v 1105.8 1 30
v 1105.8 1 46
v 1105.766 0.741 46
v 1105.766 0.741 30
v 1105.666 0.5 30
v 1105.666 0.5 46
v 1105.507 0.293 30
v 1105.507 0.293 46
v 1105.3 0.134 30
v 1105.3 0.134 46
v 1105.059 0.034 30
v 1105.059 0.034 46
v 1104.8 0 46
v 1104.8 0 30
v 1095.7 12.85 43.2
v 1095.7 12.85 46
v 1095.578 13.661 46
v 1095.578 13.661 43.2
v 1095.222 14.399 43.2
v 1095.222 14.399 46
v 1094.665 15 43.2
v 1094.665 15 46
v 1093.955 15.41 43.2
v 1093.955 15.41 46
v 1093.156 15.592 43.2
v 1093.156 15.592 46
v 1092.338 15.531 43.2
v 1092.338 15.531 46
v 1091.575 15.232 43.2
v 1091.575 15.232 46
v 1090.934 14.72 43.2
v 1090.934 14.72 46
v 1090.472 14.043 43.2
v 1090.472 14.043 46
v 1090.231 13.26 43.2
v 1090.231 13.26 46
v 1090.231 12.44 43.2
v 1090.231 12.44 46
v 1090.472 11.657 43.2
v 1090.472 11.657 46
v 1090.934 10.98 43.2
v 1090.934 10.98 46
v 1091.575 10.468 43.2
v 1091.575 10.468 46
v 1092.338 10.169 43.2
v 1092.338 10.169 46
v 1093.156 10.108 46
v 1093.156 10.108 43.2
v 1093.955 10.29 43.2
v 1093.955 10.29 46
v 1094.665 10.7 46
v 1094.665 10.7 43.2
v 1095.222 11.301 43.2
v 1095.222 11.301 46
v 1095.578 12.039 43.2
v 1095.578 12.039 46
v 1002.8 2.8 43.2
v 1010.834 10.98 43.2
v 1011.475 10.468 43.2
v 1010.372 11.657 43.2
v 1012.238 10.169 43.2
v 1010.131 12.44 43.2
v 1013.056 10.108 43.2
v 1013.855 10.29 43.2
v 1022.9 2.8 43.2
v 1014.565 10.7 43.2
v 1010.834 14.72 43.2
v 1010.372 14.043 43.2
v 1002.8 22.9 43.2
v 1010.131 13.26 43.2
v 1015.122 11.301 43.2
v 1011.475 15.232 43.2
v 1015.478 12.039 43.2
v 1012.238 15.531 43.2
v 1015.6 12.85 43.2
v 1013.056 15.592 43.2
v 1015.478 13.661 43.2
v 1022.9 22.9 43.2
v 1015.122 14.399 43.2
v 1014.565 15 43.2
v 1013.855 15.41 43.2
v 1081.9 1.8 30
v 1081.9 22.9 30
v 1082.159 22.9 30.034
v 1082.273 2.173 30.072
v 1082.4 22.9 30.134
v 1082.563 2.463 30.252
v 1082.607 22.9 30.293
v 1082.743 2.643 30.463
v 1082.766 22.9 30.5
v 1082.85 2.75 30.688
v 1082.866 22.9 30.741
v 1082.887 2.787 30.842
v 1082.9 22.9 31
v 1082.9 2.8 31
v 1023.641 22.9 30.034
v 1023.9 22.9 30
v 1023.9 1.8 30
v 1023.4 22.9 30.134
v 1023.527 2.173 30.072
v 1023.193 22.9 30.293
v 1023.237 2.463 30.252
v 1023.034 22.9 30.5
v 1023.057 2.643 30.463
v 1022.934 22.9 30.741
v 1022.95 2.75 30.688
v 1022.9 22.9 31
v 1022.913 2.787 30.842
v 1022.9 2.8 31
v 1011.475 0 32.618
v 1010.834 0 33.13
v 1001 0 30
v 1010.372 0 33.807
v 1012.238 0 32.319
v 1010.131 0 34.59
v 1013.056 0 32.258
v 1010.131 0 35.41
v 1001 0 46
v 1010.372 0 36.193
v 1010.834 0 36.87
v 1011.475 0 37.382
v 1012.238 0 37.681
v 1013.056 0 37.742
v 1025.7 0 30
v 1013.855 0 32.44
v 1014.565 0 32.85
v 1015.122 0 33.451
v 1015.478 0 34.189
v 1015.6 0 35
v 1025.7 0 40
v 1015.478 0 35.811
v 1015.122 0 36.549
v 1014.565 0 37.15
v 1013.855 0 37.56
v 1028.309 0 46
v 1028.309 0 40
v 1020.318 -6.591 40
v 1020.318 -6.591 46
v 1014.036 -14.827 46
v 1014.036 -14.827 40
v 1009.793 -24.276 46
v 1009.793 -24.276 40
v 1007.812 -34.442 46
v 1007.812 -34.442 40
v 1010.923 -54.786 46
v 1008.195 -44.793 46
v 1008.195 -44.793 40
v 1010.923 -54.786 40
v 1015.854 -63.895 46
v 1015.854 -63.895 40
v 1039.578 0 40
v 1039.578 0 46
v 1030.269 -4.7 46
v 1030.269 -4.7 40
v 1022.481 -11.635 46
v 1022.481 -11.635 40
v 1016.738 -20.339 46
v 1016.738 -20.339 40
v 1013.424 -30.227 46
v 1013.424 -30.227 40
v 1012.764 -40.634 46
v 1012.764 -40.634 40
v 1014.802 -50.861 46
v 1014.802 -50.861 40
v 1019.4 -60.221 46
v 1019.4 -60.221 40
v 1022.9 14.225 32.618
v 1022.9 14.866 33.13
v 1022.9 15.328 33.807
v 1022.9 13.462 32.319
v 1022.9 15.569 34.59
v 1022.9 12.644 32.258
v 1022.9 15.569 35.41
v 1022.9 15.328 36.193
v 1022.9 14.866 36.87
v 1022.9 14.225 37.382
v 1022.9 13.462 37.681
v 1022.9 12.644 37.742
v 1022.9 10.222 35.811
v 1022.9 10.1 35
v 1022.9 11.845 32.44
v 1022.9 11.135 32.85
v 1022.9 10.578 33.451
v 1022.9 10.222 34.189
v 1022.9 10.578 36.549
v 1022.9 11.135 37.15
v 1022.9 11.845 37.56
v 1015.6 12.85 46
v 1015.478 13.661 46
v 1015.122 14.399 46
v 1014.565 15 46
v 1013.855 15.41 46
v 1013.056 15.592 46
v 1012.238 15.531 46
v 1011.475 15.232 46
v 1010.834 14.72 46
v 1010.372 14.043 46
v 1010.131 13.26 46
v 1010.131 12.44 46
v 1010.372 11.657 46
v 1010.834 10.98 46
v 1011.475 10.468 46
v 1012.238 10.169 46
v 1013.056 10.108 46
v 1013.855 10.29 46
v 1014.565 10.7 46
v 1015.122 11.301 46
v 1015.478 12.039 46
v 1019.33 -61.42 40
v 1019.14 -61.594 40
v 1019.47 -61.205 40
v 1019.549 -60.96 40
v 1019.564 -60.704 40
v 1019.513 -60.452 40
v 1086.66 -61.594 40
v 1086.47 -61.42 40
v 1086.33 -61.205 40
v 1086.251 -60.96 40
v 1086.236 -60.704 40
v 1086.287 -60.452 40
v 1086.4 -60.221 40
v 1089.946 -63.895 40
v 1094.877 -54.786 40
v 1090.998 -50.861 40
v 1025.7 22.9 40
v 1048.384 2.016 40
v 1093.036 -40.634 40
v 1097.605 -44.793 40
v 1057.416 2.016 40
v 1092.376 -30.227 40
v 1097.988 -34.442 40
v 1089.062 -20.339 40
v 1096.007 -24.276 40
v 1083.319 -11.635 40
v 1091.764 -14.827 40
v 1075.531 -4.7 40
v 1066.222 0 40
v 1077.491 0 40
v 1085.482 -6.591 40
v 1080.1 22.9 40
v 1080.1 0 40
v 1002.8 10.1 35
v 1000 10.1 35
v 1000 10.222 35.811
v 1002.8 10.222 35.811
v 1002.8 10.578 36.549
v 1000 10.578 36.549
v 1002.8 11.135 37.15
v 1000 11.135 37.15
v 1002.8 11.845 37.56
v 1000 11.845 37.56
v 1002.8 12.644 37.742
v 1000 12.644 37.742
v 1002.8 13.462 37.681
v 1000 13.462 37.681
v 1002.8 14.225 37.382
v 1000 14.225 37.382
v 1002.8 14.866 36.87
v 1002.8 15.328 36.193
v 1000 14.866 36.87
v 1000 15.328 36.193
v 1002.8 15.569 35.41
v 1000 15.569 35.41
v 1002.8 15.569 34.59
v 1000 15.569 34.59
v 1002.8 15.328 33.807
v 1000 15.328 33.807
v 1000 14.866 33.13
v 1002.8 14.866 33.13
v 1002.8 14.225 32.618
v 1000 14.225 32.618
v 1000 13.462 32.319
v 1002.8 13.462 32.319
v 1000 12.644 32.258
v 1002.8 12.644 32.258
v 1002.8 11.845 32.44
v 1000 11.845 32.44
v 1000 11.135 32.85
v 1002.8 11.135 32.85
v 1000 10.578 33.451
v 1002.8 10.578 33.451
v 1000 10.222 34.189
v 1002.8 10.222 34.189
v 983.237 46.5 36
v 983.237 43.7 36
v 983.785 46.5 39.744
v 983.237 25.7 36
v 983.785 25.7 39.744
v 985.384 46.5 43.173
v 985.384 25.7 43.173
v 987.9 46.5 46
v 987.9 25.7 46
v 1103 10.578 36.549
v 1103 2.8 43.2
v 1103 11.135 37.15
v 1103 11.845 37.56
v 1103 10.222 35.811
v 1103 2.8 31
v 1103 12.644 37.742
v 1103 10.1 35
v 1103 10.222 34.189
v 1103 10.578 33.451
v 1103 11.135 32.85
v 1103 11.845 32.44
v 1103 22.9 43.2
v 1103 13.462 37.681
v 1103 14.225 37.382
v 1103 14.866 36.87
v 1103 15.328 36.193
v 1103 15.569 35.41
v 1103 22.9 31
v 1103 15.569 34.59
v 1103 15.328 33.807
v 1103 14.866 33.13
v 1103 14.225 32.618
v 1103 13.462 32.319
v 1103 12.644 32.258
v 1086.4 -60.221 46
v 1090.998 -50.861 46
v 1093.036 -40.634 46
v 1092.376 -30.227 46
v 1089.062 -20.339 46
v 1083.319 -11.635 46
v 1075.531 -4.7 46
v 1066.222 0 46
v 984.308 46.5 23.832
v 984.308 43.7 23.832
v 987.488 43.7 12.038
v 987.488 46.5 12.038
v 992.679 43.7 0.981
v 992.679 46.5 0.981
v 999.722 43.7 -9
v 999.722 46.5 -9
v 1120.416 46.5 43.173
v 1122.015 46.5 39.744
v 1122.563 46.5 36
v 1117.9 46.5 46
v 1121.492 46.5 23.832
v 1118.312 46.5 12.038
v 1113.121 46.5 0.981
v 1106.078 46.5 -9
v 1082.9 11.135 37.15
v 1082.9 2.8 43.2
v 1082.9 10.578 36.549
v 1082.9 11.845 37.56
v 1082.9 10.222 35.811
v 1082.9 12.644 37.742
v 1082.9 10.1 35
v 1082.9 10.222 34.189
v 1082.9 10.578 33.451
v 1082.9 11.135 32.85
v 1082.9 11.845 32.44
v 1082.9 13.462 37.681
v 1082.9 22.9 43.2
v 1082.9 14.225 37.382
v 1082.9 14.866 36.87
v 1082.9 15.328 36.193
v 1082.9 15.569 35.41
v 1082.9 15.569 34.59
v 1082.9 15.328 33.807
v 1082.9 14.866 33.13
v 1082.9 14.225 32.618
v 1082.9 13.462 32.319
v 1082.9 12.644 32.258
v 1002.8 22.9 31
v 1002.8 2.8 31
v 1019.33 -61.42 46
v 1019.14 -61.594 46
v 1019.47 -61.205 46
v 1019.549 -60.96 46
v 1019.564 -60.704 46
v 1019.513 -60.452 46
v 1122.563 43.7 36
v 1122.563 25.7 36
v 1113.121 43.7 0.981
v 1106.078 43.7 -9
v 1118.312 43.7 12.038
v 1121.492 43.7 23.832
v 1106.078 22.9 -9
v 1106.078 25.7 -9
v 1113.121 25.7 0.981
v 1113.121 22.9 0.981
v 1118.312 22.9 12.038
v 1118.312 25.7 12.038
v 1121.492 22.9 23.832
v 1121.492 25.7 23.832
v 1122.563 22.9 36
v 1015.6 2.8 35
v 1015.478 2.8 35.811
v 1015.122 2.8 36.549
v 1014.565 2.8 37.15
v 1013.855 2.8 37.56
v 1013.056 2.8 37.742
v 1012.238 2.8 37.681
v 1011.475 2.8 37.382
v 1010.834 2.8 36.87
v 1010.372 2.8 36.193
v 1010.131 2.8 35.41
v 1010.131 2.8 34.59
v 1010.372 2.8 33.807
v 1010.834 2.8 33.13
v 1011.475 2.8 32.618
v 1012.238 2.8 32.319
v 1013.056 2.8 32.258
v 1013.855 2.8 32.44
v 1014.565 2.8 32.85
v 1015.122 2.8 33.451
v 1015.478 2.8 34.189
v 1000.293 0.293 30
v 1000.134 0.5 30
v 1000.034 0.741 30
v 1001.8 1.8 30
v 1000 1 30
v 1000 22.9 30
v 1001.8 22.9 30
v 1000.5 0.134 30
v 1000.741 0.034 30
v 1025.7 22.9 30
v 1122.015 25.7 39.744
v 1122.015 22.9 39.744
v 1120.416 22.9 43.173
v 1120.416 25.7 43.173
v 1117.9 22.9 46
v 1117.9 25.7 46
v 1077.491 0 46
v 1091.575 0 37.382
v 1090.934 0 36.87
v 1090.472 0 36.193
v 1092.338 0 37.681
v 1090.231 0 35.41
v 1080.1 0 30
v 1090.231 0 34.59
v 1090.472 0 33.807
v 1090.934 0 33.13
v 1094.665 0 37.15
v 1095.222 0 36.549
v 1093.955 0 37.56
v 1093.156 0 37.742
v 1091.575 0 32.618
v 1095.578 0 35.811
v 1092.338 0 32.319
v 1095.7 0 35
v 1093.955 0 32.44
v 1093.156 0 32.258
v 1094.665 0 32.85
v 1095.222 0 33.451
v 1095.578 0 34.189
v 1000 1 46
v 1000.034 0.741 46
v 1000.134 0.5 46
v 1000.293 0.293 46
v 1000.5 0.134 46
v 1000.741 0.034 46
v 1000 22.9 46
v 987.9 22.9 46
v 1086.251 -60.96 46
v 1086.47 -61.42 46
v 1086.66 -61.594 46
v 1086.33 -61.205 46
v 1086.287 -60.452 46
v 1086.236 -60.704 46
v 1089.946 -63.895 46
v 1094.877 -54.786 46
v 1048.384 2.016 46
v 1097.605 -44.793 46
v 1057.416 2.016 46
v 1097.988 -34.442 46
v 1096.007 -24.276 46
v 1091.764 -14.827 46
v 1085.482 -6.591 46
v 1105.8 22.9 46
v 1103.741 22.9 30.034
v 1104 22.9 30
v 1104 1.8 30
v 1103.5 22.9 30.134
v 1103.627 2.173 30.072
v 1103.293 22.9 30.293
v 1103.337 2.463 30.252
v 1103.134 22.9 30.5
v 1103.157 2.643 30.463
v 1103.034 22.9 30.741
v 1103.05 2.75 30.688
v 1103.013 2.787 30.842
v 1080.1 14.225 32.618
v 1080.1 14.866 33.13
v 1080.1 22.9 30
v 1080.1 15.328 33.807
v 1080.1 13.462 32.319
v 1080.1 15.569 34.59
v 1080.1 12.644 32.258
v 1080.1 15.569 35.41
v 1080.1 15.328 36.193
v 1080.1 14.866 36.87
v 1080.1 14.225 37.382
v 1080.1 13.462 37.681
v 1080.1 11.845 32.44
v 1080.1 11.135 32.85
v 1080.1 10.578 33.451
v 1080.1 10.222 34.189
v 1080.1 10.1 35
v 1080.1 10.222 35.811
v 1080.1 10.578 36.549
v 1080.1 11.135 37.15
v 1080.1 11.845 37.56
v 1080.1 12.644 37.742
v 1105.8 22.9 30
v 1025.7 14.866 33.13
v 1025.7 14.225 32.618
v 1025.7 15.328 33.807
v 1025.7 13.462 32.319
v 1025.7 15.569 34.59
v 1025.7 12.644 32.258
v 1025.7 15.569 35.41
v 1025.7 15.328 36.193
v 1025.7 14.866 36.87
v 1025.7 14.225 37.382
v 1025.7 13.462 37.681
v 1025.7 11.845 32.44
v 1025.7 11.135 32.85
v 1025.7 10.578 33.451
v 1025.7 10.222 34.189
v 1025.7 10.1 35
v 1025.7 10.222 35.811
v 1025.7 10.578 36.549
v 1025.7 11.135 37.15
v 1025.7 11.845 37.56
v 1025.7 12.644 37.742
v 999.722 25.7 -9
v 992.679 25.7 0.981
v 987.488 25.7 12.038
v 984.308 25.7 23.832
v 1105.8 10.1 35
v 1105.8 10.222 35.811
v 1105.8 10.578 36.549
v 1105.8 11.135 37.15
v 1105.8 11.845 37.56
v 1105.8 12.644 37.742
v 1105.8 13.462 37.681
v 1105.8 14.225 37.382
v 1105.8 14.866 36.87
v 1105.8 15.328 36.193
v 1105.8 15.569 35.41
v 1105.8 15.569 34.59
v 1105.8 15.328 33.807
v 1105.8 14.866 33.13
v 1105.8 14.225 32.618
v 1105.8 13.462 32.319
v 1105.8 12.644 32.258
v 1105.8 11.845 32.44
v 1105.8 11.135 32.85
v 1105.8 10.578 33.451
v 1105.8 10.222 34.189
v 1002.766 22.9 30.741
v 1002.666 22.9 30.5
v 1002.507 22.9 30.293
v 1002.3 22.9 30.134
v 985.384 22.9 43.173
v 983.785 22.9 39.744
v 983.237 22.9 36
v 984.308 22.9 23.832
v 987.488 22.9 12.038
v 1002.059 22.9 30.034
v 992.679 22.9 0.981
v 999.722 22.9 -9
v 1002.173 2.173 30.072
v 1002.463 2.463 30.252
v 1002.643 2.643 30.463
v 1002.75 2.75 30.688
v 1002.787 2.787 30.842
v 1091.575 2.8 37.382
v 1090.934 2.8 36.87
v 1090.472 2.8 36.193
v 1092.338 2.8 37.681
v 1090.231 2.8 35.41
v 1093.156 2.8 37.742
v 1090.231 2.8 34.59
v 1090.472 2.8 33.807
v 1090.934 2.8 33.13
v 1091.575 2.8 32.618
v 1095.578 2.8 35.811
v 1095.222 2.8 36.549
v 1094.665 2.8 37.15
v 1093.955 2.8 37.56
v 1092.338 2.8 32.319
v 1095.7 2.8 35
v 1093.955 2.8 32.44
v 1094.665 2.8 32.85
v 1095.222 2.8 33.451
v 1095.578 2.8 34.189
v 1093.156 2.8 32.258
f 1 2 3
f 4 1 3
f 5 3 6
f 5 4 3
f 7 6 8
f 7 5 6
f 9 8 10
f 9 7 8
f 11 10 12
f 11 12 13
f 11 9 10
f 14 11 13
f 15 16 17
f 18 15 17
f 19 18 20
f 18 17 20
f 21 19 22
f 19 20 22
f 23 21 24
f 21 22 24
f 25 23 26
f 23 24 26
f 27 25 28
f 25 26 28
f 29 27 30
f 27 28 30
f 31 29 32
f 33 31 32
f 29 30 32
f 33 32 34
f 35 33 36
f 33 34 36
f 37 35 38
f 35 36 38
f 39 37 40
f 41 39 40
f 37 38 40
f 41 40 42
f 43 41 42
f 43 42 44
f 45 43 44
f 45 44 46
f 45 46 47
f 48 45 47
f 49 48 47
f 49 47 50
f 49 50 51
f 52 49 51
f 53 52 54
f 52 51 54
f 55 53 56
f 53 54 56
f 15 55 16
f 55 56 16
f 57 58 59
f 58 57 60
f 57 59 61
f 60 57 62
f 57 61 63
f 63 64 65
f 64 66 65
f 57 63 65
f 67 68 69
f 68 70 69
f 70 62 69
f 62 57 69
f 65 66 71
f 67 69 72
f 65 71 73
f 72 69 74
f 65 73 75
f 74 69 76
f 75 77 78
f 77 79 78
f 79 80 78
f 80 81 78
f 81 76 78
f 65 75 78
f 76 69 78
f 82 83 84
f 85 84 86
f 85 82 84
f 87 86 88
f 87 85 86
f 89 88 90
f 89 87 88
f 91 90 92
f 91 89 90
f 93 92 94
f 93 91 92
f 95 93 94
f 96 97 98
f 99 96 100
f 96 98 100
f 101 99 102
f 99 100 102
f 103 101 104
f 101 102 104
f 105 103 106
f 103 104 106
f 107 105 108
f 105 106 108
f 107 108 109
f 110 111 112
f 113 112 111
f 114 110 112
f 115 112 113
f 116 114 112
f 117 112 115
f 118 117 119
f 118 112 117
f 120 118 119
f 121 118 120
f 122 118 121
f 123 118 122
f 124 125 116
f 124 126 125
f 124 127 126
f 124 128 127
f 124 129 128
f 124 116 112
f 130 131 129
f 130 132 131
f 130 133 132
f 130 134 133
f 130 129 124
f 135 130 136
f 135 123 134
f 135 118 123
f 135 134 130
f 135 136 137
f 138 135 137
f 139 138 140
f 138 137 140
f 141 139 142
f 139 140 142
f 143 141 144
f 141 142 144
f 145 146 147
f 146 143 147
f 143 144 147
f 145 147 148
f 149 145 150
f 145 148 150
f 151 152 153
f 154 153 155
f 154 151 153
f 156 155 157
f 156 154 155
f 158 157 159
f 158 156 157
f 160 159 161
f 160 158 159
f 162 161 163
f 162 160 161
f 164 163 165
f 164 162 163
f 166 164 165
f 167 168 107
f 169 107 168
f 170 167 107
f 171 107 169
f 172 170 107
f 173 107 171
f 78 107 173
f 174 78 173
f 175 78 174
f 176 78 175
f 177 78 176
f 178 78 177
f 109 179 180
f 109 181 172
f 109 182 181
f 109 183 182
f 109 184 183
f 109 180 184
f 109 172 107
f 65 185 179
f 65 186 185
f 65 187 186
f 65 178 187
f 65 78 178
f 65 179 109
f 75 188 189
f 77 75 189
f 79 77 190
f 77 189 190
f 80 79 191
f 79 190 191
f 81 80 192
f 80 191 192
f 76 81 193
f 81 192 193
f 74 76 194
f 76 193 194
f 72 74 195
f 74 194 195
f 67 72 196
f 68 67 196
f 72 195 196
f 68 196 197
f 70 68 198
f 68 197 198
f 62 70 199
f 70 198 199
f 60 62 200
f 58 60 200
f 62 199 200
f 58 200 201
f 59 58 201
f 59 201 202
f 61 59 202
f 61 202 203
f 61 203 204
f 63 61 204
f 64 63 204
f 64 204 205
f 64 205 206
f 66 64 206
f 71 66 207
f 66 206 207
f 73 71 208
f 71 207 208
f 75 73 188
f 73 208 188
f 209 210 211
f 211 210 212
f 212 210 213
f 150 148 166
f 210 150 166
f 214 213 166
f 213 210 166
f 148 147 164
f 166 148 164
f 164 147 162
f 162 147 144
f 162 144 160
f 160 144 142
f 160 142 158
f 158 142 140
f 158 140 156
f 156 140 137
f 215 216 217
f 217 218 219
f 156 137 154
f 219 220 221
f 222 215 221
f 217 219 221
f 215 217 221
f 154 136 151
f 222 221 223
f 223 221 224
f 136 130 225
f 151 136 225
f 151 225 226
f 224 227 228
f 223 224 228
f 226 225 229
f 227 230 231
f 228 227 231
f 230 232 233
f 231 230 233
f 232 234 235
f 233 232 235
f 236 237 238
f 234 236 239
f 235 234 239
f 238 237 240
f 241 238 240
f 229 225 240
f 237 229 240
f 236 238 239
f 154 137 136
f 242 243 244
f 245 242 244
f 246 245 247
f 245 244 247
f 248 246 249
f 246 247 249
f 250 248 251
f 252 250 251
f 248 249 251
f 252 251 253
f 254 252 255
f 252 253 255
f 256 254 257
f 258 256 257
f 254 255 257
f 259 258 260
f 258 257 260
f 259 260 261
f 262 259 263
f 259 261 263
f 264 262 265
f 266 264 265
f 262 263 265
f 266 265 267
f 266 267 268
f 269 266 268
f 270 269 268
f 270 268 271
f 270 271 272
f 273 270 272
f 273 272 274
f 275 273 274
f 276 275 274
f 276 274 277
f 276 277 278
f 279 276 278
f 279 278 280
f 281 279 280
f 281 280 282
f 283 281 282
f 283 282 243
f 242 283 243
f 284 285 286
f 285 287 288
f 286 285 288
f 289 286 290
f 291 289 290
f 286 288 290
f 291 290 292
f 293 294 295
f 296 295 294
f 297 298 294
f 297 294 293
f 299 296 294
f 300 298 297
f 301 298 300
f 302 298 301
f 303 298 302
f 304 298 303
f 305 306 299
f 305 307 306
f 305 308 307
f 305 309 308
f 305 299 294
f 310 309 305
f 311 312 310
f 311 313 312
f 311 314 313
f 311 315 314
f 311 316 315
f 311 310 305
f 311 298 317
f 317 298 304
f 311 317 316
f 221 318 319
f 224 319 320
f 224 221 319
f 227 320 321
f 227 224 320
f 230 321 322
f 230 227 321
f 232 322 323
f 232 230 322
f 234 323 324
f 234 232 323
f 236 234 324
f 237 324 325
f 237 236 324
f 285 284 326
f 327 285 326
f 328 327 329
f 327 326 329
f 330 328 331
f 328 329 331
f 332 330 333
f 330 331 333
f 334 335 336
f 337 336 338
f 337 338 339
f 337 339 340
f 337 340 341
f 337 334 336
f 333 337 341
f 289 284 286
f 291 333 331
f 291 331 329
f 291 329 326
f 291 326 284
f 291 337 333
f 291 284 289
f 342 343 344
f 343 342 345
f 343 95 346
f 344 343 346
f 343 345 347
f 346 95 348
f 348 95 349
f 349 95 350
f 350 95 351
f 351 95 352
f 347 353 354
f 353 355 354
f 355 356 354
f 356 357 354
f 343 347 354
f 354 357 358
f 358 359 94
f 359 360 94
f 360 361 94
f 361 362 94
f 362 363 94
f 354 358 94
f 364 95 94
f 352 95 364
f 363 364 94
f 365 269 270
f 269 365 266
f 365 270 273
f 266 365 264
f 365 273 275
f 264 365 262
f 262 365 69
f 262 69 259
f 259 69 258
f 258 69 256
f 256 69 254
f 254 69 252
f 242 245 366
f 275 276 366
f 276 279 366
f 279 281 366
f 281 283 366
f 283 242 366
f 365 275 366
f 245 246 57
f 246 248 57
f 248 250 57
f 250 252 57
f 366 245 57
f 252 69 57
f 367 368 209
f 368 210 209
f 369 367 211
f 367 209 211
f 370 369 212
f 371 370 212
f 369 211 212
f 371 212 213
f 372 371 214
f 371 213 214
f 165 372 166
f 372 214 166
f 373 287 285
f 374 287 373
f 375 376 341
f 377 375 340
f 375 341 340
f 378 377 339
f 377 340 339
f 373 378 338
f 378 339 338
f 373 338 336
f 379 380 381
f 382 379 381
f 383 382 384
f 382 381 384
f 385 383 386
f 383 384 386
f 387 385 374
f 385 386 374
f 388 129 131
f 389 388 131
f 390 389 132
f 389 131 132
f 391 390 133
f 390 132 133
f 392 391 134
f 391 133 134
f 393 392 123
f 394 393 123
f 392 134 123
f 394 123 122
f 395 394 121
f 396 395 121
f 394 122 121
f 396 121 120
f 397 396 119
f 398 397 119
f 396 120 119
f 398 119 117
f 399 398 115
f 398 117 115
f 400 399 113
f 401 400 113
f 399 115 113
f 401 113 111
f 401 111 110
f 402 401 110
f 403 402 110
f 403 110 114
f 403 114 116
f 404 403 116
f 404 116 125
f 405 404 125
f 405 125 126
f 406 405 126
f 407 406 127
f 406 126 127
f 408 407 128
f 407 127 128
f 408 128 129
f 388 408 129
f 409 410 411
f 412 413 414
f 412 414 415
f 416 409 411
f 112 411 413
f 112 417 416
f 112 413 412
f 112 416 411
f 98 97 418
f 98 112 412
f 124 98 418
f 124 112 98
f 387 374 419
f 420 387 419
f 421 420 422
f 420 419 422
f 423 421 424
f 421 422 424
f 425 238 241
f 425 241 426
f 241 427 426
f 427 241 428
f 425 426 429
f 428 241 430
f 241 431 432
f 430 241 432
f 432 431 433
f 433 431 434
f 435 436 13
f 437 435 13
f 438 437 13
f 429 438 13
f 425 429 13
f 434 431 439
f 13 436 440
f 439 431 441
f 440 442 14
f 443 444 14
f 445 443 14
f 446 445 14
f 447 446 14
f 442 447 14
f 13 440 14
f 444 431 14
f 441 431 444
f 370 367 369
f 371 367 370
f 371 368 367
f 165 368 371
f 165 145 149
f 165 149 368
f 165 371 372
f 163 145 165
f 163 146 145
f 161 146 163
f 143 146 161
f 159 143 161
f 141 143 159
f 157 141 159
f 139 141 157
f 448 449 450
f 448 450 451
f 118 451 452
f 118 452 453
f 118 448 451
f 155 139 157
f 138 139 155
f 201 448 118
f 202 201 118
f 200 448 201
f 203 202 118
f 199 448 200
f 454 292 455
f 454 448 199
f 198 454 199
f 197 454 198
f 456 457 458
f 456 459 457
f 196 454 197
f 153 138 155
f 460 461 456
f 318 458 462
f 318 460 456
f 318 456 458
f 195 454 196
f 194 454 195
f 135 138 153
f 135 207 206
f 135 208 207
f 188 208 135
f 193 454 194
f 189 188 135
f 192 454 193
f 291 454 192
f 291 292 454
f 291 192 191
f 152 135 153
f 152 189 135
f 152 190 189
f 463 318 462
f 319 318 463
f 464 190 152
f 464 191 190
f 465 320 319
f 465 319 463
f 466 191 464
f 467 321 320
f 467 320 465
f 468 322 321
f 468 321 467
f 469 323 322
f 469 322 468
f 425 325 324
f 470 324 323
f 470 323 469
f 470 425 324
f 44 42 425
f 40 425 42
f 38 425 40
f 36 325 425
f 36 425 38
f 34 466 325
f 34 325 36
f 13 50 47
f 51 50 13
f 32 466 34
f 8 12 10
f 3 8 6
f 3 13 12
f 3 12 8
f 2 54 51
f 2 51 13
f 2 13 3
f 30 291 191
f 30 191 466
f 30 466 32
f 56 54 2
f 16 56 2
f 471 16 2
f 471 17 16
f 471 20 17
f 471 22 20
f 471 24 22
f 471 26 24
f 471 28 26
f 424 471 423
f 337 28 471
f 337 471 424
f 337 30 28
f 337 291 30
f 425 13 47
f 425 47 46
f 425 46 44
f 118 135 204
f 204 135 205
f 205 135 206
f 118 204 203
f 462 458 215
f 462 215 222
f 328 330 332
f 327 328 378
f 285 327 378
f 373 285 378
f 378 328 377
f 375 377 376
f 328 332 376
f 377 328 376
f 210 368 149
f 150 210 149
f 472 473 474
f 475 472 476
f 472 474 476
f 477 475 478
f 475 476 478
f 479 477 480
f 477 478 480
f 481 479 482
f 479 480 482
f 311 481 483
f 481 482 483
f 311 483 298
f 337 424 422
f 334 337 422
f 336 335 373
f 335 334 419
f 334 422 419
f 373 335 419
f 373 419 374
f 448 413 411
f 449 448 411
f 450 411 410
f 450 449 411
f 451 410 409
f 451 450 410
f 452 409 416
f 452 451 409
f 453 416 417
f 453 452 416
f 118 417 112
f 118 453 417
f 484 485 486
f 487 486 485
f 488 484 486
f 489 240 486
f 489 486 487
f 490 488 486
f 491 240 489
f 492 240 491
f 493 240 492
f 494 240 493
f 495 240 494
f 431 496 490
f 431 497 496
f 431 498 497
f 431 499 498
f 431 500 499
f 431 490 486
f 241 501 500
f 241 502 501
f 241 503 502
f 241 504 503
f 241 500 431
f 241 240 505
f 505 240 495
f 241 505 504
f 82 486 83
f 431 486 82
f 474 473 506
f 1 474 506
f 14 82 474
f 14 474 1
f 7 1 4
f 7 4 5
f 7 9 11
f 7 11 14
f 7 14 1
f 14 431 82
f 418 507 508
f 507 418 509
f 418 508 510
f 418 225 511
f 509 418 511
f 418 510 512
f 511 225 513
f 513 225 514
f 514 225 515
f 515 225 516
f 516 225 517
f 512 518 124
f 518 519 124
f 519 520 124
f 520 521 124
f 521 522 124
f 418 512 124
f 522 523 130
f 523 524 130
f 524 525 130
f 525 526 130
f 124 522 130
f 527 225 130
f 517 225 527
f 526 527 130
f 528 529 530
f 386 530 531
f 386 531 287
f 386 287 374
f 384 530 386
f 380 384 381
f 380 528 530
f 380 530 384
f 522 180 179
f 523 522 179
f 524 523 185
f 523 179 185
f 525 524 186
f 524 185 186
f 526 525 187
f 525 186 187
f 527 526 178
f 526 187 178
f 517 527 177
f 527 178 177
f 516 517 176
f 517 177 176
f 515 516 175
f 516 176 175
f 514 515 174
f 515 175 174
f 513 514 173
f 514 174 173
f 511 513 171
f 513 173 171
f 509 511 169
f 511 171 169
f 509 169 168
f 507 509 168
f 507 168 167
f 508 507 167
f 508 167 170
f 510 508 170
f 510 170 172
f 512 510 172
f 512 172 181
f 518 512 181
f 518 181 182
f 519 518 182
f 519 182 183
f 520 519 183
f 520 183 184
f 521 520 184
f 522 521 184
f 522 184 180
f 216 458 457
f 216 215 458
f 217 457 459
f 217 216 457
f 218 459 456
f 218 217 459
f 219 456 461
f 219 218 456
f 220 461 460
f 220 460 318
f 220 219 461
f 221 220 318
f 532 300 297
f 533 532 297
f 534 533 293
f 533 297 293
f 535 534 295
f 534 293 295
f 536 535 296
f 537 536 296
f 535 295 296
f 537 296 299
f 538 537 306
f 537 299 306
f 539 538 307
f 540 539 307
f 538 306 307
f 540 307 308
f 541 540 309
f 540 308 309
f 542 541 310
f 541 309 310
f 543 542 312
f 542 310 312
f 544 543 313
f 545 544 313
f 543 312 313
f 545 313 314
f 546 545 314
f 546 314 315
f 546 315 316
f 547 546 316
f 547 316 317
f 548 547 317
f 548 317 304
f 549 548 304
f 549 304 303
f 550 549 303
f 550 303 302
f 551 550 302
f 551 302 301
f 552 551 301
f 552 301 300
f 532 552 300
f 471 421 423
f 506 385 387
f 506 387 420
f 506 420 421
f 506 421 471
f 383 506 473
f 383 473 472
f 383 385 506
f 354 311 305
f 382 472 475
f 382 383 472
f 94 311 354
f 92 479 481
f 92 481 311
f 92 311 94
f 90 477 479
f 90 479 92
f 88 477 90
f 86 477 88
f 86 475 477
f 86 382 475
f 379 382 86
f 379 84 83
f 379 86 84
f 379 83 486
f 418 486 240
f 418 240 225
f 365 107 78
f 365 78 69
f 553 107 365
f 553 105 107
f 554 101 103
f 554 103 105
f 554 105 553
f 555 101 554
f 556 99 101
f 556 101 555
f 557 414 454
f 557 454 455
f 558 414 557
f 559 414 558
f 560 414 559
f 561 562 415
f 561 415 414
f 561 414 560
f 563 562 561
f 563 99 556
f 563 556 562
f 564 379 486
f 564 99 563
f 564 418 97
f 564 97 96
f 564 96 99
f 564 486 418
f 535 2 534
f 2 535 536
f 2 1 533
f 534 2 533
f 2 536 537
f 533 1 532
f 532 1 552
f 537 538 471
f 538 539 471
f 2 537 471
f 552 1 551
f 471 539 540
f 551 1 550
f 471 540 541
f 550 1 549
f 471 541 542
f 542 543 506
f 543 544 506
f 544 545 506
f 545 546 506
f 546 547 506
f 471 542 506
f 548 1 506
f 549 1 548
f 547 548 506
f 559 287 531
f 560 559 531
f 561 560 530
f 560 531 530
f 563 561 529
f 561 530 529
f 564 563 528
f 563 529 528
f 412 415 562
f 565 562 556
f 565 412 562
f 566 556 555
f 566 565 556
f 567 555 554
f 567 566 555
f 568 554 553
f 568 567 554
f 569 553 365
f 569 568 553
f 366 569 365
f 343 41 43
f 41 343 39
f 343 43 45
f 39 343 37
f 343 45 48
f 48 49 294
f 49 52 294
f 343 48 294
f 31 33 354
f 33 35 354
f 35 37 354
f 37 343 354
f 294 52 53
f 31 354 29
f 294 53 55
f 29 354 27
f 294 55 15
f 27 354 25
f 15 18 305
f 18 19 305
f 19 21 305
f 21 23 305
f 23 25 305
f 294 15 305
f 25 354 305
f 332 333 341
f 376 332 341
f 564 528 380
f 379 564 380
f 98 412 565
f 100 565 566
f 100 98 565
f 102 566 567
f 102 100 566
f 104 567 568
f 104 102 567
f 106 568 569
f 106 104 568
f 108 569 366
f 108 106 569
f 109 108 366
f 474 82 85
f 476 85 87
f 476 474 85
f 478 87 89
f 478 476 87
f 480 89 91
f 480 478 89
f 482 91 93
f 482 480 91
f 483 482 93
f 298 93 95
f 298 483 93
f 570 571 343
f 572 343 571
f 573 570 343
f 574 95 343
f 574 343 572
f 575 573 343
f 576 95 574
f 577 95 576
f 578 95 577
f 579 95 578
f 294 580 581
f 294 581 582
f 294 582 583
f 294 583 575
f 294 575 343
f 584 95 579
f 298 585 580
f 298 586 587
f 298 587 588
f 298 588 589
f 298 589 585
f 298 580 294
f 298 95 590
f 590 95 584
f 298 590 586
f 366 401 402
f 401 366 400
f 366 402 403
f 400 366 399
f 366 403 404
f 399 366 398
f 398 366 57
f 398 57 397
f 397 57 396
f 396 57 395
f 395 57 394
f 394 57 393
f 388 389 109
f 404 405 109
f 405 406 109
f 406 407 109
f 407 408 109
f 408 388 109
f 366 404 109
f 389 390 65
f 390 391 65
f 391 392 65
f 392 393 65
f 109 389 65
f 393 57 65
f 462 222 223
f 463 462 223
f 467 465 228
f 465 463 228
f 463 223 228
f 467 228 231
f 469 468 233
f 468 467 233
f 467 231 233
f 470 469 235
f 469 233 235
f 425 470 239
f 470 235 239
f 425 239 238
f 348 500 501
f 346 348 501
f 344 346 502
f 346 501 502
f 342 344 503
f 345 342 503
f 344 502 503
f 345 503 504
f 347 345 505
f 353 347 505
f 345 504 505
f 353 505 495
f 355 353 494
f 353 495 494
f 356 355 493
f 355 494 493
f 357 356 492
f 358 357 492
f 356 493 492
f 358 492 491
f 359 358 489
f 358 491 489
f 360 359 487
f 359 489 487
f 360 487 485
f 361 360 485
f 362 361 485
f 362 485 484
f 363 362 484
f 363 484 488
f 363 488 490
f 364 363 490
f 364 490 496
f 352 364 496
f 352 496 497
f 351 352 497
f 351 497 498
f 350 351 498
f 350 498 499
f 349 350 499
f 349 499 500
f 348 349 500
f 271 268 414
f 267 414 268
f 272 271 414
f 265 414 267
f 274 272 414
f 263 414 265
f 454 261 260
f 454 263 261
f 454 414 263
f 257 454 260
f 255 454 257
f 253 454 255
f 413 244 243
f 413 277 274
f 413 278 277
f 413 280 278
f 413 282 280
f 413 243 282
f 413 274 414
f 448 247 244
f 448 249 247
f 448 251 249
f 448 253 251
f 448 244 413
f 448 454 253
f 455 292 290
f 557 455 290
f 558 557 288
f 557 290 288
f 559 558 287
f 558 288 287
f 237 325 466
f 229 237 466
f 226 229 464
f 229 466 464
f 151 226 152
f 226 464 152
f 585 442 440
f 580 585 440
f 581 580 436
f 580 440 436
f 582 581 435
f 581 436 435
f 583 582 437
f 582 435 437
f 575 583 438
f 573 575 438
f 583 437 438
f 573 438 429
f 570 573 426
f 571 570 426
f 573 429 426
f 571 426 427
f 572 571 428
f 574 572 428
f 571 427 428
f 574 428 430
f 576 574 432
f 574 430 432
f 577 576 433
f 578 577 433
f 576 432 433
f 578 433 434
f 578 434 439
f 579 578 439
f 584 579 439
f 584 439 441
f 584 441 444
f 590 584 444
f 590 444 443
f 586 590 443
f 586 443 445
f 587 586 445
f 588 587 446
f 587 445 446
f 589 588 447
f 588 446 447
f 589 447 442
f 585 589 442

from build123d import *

# Parameters (mm, degrees)
SKETCH038_W     = 105.8
SKETCH038_H     = 25.7
SKETCH038_W_2   = 20.1
SKETCH038_H_2   = 20.1
PAD020_DEPTH    = 6
SKETCH036_R     = 45.225
SKETCH036_R_2   = 40.225
PAD019_DEPTH    = 6
POCKET020_DEPTH = 6
POCKET021_DEPTH = 6
FILLET008_R     = 1
SKETCH034_W     = 25.7
SKETCH034_H     = 25.7
SKETCH034_W_2   = 20.1
SKETCH034_H_2   = 20.1
PAD021_DEPTH    = 10
SKETCH033_R     = 2.75
POCKET024_DEPTH = 105.8
SKETCH040_R     = 2.75
POCKET023_DEPTH = 2.8
FILLET009_R     = 1
PAD022_DEPTH    = 20.8
PAD018_DEPTH    = 2.8
SKETCH041_W     = 139.326154
SKETCH041_H     = 46.5
POCKET025_DEPTH = 61
SKETCH035_W     = 139.326154
SKETCH035_H     = 18
POCKET022_DEPTH = 45
SKETCH051_W     = 20.1
SKETCH051_H     = 20.1
SKETCH051_R     = 2.75
PAD028_DEPTH    = 2.8


with BuildPart() as part:
    # Sketch038 → Pad020 (new body)
    with BuildSketch(Plane.XY):
        with Locations((52.9, 12.85)):
            Rectangle(SKETCH038_W, SKETCH038_H)
        with Locations((12.85, 12.85)):
            Rectangle(SKETCH038_W_2, SKETCH038_H_2, mode=Mode.SUBTRACT)
        with Locations((92.95, 12.85)):
            Rectangle(SKETCH038_W_2, SKETCH038_H_2, mode=Mode.SUBTRACT)
    extrude(amount=PAD020_DEPTH)

    # Sketch036 → Pad019 (join)
    with BuildSketch(Plane.XY):
        with Locations((52.9, -37.955)):
            Circle(SKETCH036_R)
        with Locations((52.9, -37.955)):
            Circle(SKETCH036_R_2, mode=Mode.SUBTRACT)
    extrude(amount=PAD019_DEPTH)

    # Pad019 Face25 → Pocket020 (cut)
    with BuildSketch(Plane(origin=(52.9, 0.910232, 6), x_dir=(0, 1, 0), z_dir=(0, 0, 1))):
        with BuildLine():
            ThreePointArc((-0.910232, -13.321734), (1.359768, 0), (-0.910232, 13.321734))
            Line((-0.910232, 13.321734), (-0.910232, -13.321734))
        make_face()
    extrude(amount=-POCKET020_DEPTH, mode=Mode.SUBTRACT)

    # Sketch039 → Pocket021 (cut)
    with BuildSketch(Plane.XY):
        with BuildLine():
            Line((52.9, -37.955), (94.041911, -66.762877))
            ThreePointArc((11.758089, -66.762877), (52.9, -88.18), (94.041911, -66.762877))
            Line((52.9, -37.955), (11.758089, -66.762877))
        make_face()
    extrude(amount=POCKET021_DEPTH, mode=Mode.SUBTRACT)

    # Fillet008
    fillet008_edges = [part.edges().sort_by_distance(p)[0] for p in [
        (19.949609, -61.027112, 3),
        (85.850391, -61.027112, 3),
    ]]
    fillet(fillet008_edges, radius=FILLET008_R)

    # Sketch034 (on Face11 of Fillet008) → Pad021 (join)
    with BuildSketch(Plane(origin=(0, 0, 0), x_dir=(1, 0, 0), z_dir=(0, 0, -1))):
        with Locations((12.85, -12.85)):
            Rectangle(SKETCH034_W, SKETCH034_H)
        with Locations((12.85, -12.85)):
            Rectangle(SKETCH034_W_2, SKETCH034_H_2, mode=Mode.SUBTRACT)
        with Locations((92.95, -12.85)):
            Rectangle(SKETCH034_W, SKETCH034_H)
        with Locations((92.95, -12.85)):
            Rectangle(SKETCH034_W_2, SKETCH034_H_2, mode=Mode.SUBTRACT)
    extrude(amount=PAD021_DEPTH)

    # Sketch033 (on Face27 of Pad021) → Pocket024 (cut)
    with BuildSketch(Plane(origin=(0, 0, 0), x_dir=(0, -1, 0), z_dir=(-1, 0, 0))):
        with Locations((-12.85, -5)):
            Circle(SKETCH033_R)
    extrude(amount=-POCKET024_DEPTH, mode=Mode.SUBTRACT)

    # Sketch040 (on Face13 of Pocket024) → Pocket023 (cut)
    with BuildSketch(Plane.XZ):
        with Locations((12.85, -5)):
            Circle(SKETCH040_R)
        with Locations((92.95, -5)):
            Circle(SKETCH040_R)
    extrude(amount=-POCKET023_DEPTH, mode=Mode.SUBTRACT)

    # Fillet009
    fillet009_edges = [part.edges().sort_by_distance(p)[0] for p in [
        (103, 12.85, -10),
        (92.95, 2.8, -10),
        (82.9, 12.85, -10),
        (22.9, 12.85, -10),
        (12.85, 2.8, -10),
        (2.8, 12.85, -10),
        (0, 0, -5),
        (0, 0, 3),
        (105.8, 0, -5),
        (105.8, 0, 3),
    ]]
    fillet(fillet009_edges, radius=FILLET009_R)

    # Sketch037 (on Face12 of Fillet009) → Pad022 (join)
    with BuildSketch(Plane(origin=(0, 25.7, 0), x_dir=(-1, 0, 0), z_dir=(0, 1, 0))):
        with BuildLine():
            Line((12.1, 6), (-117.9, 6))
            ThreePointArc((-117.9, 6), (-121.340012, 1.51689), (-122.563077, -4))
            ThreePointArc((-122.563077, -4), (-52.9, -73.663077), (16.763077, -4))
            ThreePointArc((16.763077, -4), (15.540012, 1.51689), (12.1, 6))
        make_face()
    extrude(amount=PAD022_DEPTH)

    # Pad022 Face4 → Pad018 (add)
    with BuildSketch(Plane(origin=(52.9, 25.7, -32.391454), x_dir=(-1, 0, 0), z_dir=(0, -1, 0))):
        with BuildLine():
            ThreePointArc((65, -38.391454), (68.440012, -33.908343), (69.663077, -28.391454))
            ThreePointArc((69.663077, -28.391454), (0, 41.271623), (-69.663077, -28.391454))
            ThreePointArc((-69.663077, -28.391454), (-68.440012, -33.908343), (-65, -38.391454))
            Line((-65, -38.391454), (-52.9, -38.391454))
            Line((-52.9, -38.391454), (-52.9, -32.391454))
            Line((-52.9, -32.391454), (-52.9, -22.391454))
            Line((-52.9, -22.391454), (-27.2, -22.391454))
            Line((-27.2, -22.391454), (-27.2, -32.391454))
            Line((-27.2, -32.391454), (27.2, -32.391454))
            Line((27.2, -32.391454), (27.2, -22.391454))
            Line((27.2, -22.391454), (52.9, -22.391454))
            Line((52.9, -22.391454), (52.9, -32.391454))
            Line((52.9, -32.391454), (52.9, -38.391454))
            Line((52.9, -38.391454), (65, -38.391454))
        make_face()
    extrude(amount=PAD018_DEPTH)

    # Sketch041 → Pocket025 (cut)
    with BuildSketch(Plane.XY.offset(-49)):
        with Locations((52.9, 23.25)):
            Rectangle(SKETCH041_W, SKETCH041_H)
    extrude(amount=-POCKET025_DEPTH, mode=Mode.SUBTRACT)

    # Sketch035 (on Face28 of Pocket025) → Pocket022 (cut)
    with BuildSketch(Plane(origin=(0, 0, -49), x_dir=(1, 0, 0), z_dir=(0, 0, -1))):
        with Locations((52.9, -34.7)):
            Rectangle(SKETCH035_W, SKETCH035_H)
    extrude(amount=-POCKET022_DEPTH, mode=Mode.SUBTRACT)

    # Sketch051 (on Face5 of Pocket022) → Pad028 (join)
    with BuildSketch(Plane.XY.offset(6)):
        with Locations((12.85, 12.85)):
            Rectangle(SKETCH051_W, SKETCH051_H)
        with Locations((12.85, 12.85)):
            Circle(SKETCH051_R, mode=Mode.SUBTRACT)
        with Locations((92.95, 12.85)):
            Rectangle(SKETCH051_W, SKETCH051_H)
        with Locations((92.95, 12.85)):
            Circle(SKETCH051_R, mode=Mode.SUBTRACT)
    extrude(amount=-PAD028_DEPTH)


with BuildPart() as part_1:
    # Body006 placement: moved
    add(part.part.moved(Location((1000, 0, 40))))


solid = part_1.part
